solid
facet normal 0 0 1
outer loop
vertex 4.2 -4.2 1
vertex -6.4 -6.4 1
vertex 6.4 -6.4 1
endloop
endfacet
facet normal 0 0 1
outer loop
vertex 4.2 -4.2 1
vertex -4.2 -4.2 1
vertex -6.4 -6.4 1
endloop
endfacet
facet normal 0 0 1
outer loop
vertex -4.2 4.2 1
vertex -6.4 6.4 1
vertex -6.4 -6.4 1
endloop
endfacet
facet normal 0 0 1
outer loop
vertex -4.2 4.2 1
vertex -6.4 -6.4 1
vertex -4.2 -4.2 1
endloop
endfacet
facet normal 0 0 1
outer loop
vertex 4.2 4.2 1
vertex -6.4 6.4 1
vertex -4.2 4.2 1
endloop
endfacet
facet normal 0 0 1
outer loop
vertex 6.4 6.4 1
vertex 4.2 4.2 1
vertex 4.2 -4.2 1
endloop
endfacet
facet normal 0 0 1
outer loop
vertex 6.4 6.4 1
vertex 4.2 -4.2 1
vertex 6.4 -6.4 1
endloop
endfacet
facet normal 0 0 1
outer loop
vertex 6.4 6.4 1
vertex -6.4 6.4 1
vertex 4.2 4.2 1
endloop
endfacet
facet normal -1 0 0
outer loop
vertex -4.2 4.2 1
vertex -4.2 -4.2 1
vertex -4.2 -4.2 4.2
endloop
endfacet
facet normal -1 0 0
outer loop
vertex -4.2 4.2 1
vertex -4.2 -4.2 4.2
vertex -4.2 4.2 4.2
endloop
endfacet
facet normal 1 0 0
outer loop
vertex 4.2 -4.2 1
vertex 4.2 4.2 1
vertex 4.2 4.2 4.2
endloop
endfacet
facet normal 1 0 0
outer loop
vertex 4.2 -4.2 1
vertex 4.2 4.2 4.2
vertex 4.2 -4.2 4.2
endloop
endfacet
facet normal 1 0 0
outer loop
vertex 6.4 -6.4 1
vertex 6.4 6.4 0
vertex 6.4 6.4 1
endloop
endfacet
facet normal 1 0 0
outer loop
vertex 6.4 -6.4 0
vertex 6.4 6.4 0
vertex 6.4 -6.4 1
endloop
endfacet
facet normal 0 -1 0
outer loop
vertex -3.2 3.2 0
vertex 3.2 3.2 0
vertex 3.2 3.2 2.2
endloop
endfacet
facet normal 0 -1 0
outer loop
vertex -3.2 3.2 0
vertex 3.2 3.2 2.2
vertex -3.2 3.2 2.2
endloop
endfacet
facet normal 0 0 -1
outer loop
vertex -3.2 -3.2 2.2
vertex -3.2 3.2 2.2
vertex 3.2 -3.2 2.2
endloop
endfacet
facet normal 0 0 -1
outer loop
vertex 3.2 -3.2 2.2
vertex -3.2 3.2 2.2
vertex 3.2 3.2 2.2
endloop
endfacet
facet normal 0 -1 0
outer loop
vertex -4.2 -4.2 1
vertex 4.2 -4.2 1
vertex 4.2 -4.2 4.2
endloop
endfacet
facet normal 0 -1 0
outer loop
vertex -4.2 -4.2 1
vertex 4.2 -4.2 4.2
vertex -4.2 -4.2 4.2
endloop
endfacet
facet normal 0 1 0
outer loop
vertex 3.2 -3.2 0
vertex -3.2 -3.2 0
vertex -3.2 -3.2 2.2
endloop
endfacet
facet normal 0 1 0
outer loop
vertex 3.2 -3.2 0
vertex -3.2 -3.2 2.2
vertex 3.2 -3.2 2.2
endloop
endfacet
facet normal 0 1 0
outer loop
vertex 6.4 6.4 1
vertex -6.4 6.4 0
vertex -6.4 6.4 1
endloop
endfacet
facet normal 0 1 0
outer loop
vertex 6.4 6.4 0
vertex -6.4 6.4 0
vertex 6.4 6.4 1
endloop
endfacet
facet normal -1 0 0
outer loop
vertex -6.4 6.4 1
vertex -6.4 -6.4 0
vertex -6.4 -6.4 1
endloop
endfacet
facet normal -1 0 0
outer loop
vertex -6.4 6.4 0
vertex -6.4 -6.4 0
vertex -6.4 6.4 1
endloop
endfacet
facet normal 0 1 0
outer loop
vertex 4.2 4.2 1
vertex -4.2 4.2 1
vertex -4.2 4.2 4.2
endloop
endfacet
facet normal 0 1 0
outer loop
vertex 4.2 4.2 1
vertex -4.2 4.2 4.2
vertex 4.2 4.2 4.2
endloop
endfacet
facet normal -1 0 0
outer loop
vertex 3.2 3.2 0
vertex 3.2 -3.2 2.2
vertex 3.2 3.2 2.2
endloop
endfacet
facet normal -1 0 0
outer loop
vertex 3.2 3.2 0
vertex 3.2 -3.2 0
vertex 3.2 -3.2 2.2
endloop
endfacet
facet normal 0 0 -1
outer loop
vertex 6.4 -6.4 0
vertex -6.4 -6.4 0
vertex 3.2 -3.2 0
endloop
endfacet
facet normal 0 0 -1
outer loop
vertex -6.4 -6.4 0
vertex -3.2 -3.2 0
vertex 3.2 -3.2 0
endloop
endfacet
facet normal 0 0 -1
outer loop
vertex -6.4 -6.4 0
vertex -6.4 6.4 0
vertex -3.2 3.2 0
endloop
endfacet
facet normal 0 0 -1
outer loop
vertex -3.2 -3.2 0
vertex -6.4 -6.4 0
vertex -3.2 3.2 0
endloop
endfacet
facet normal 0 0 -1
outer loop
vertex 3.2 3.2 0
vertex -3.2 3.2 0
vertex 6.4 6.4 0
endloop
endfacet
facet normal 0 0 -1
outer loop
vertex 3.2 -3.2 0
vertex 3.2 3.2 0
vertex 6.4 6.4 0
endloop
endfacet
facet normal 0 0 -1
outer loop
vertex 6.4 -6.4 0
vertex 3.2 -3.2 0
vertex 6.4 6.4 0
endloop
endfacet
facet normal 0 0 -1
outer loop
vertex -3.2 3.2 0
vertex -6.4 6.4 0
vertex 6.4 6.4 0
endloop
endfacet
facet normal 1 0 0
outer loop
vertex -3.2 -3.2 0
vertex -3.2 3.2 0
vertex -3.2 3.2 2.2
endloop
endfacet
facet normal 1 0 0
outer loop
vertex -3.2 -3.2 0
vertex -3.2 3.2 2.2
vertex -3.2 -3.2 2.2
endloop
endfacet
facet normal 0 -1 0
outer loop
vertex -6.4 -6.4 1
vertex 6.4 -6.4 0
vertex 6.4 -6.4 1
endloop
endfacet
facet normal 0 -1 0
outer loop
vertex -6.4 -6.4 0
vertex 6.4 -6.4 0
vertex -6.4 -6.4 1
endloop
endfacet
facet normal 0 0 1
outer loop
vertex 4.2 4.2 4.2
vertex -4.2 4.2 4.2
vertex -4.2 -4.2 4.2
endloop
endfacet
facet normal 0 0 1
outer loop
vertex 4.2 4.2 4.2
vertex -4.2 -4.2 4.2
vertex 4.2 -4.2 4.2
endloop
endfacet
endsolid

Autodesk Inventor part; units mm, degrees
ref_plane "YZ Plane" through (0, 0, 0) normal (1, 0, 0) x (0, 1, 0)
ref_plane "XZ Plane" through (0, 0, 0) normal (0, 1, 0) x (-1, 0, 0)
ref_plane "XY Plane" through (0, 0, 0) normal (0, 0, 1) x (1, 0, 0)
sketch "Sketch1" plane through (0, 0, 0) normal (0, 0, 1) x (1, 0, 0)
  line L0 (-3.2, -3.2) -> (3.2, -3.2)
  line L1 (3.2, -3.2) -> (3.2, 3.2)
  line L2 (3.2, 3.2) -> (-3.2, 3.2)
  line L3 (-3.2, 3.2) -> (-3.2, -3.2)
  line L4 (-3.2, -3.2) -> (3.2, 3.2) construction
  line L5 (3.2, -3.2) -> (-3.2, 3.2) construction
  line L6 (-4.2, 4.2) -> (4.2, 4.2)
  line L7 (4.2, 4.2) -> (4.2, -4.2)
  line L8 (4.2, -4.2) -> (-4.2, -4.2)
  line L9 (-4.2, -4.2) -> (-4.2, 4.2)
  line L10 (-4.2, 4.2) -> (4.2, -4.2) construction
  line L11 (4.2, 4.2) -> (-4.2, -4.2) construction
  line L12 (6.4, -6.4) -> (-6.4, -6.4)
  line L13 (-6.4, -6.4) -> (-6.4, 6.4)
  line L14 (-6.4, 6.4) -> (6.4, 6.4)
  line L15 (6.4, 6.4) -> (6.4, -6.4)
  line L16 (6.4, -6.4) -> (-6.4, 6.4) construction
  line L17 (-6.4, -6.4) -> (6.4, 6.4) construction
  point P0 (0, 0)
  dimension "d0" = 6.4
  dimension "d1" = 6.4
  dimension "d2" = 8.4
  dimension "d3" = 8.4
  dimension "d4" = 12.8
extrude "Extrusion1" add sketch "Sketch1" along normal blind 1 contours L6 L7 L8 L9 | L12 L13 L14 L15
extrude "Extrusion2" add sketch "Sketch1" along normal blind 3.2 from surface at 1 contours L6 L7 L8 L9
extrude "Extrusion3" add sketch "Sketch1" against normal blind 2 from surface at 4.2 contours L3 L2 L1 L0 | L6 L7 L8 L9
properties part number "reset button cover"
